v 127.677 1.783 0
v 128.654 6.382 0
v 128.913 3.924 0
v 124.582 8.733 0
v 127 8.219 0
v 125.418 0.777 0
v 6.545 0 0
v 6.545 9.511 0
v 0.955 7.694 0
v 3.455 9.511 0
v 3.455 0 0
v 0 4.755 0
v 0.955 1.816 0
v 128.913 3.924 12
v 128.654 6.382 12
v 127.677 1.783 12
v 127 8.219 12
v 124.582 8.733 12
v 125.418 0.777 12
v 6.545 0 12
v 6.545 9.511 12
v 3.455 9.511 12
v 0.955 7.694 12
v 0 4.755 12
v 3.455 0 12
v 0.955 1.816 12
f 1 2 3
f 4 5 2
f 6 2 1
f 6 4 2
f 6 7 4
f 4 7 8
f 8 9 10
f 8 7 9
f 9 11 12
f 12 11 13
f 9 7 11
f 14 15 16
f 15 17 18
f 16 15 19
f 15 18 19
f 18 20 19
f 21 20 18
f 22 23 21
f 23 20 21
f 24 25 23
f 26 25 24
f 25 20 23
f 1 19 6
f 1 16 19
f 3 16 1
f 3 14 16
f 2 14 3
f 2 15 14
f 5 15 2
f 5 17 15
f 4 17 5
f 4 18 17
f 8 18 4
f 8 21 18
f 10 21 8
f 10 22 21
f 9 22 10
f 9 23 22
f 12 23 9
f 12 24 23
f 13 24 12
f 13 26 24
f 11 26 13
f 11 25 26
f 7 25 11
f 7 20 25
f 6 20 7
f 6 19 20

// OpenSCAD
$fn = 32;

// ----------------------------------------------------------------------
// Lever arm: two bosses 10 and 8 mm, 75 mm between centres
// ----------------------------------------------------------------------

// --- parameters (mm) ---
profile_height = 12;      // extrusion height
profile_points = 13;      // points of the closed outline

profile = [[0, 4.755], [0.955, 1.816], [3.455, 0], [6.545, 0], [125.418, 0.777], [127.677, 1.783], [128.913, 3.924], [128.654, 6.382], [127, 8.219], [124.582, 8.733], [6.545, 9.511], [3.455, 9.511], [0.955, 7.694]];  // single closed polygon, 13 points, counter clockwise

// --- the one profile operation ---
linear_extrude(height = profile_height) polygon(points = profile);
